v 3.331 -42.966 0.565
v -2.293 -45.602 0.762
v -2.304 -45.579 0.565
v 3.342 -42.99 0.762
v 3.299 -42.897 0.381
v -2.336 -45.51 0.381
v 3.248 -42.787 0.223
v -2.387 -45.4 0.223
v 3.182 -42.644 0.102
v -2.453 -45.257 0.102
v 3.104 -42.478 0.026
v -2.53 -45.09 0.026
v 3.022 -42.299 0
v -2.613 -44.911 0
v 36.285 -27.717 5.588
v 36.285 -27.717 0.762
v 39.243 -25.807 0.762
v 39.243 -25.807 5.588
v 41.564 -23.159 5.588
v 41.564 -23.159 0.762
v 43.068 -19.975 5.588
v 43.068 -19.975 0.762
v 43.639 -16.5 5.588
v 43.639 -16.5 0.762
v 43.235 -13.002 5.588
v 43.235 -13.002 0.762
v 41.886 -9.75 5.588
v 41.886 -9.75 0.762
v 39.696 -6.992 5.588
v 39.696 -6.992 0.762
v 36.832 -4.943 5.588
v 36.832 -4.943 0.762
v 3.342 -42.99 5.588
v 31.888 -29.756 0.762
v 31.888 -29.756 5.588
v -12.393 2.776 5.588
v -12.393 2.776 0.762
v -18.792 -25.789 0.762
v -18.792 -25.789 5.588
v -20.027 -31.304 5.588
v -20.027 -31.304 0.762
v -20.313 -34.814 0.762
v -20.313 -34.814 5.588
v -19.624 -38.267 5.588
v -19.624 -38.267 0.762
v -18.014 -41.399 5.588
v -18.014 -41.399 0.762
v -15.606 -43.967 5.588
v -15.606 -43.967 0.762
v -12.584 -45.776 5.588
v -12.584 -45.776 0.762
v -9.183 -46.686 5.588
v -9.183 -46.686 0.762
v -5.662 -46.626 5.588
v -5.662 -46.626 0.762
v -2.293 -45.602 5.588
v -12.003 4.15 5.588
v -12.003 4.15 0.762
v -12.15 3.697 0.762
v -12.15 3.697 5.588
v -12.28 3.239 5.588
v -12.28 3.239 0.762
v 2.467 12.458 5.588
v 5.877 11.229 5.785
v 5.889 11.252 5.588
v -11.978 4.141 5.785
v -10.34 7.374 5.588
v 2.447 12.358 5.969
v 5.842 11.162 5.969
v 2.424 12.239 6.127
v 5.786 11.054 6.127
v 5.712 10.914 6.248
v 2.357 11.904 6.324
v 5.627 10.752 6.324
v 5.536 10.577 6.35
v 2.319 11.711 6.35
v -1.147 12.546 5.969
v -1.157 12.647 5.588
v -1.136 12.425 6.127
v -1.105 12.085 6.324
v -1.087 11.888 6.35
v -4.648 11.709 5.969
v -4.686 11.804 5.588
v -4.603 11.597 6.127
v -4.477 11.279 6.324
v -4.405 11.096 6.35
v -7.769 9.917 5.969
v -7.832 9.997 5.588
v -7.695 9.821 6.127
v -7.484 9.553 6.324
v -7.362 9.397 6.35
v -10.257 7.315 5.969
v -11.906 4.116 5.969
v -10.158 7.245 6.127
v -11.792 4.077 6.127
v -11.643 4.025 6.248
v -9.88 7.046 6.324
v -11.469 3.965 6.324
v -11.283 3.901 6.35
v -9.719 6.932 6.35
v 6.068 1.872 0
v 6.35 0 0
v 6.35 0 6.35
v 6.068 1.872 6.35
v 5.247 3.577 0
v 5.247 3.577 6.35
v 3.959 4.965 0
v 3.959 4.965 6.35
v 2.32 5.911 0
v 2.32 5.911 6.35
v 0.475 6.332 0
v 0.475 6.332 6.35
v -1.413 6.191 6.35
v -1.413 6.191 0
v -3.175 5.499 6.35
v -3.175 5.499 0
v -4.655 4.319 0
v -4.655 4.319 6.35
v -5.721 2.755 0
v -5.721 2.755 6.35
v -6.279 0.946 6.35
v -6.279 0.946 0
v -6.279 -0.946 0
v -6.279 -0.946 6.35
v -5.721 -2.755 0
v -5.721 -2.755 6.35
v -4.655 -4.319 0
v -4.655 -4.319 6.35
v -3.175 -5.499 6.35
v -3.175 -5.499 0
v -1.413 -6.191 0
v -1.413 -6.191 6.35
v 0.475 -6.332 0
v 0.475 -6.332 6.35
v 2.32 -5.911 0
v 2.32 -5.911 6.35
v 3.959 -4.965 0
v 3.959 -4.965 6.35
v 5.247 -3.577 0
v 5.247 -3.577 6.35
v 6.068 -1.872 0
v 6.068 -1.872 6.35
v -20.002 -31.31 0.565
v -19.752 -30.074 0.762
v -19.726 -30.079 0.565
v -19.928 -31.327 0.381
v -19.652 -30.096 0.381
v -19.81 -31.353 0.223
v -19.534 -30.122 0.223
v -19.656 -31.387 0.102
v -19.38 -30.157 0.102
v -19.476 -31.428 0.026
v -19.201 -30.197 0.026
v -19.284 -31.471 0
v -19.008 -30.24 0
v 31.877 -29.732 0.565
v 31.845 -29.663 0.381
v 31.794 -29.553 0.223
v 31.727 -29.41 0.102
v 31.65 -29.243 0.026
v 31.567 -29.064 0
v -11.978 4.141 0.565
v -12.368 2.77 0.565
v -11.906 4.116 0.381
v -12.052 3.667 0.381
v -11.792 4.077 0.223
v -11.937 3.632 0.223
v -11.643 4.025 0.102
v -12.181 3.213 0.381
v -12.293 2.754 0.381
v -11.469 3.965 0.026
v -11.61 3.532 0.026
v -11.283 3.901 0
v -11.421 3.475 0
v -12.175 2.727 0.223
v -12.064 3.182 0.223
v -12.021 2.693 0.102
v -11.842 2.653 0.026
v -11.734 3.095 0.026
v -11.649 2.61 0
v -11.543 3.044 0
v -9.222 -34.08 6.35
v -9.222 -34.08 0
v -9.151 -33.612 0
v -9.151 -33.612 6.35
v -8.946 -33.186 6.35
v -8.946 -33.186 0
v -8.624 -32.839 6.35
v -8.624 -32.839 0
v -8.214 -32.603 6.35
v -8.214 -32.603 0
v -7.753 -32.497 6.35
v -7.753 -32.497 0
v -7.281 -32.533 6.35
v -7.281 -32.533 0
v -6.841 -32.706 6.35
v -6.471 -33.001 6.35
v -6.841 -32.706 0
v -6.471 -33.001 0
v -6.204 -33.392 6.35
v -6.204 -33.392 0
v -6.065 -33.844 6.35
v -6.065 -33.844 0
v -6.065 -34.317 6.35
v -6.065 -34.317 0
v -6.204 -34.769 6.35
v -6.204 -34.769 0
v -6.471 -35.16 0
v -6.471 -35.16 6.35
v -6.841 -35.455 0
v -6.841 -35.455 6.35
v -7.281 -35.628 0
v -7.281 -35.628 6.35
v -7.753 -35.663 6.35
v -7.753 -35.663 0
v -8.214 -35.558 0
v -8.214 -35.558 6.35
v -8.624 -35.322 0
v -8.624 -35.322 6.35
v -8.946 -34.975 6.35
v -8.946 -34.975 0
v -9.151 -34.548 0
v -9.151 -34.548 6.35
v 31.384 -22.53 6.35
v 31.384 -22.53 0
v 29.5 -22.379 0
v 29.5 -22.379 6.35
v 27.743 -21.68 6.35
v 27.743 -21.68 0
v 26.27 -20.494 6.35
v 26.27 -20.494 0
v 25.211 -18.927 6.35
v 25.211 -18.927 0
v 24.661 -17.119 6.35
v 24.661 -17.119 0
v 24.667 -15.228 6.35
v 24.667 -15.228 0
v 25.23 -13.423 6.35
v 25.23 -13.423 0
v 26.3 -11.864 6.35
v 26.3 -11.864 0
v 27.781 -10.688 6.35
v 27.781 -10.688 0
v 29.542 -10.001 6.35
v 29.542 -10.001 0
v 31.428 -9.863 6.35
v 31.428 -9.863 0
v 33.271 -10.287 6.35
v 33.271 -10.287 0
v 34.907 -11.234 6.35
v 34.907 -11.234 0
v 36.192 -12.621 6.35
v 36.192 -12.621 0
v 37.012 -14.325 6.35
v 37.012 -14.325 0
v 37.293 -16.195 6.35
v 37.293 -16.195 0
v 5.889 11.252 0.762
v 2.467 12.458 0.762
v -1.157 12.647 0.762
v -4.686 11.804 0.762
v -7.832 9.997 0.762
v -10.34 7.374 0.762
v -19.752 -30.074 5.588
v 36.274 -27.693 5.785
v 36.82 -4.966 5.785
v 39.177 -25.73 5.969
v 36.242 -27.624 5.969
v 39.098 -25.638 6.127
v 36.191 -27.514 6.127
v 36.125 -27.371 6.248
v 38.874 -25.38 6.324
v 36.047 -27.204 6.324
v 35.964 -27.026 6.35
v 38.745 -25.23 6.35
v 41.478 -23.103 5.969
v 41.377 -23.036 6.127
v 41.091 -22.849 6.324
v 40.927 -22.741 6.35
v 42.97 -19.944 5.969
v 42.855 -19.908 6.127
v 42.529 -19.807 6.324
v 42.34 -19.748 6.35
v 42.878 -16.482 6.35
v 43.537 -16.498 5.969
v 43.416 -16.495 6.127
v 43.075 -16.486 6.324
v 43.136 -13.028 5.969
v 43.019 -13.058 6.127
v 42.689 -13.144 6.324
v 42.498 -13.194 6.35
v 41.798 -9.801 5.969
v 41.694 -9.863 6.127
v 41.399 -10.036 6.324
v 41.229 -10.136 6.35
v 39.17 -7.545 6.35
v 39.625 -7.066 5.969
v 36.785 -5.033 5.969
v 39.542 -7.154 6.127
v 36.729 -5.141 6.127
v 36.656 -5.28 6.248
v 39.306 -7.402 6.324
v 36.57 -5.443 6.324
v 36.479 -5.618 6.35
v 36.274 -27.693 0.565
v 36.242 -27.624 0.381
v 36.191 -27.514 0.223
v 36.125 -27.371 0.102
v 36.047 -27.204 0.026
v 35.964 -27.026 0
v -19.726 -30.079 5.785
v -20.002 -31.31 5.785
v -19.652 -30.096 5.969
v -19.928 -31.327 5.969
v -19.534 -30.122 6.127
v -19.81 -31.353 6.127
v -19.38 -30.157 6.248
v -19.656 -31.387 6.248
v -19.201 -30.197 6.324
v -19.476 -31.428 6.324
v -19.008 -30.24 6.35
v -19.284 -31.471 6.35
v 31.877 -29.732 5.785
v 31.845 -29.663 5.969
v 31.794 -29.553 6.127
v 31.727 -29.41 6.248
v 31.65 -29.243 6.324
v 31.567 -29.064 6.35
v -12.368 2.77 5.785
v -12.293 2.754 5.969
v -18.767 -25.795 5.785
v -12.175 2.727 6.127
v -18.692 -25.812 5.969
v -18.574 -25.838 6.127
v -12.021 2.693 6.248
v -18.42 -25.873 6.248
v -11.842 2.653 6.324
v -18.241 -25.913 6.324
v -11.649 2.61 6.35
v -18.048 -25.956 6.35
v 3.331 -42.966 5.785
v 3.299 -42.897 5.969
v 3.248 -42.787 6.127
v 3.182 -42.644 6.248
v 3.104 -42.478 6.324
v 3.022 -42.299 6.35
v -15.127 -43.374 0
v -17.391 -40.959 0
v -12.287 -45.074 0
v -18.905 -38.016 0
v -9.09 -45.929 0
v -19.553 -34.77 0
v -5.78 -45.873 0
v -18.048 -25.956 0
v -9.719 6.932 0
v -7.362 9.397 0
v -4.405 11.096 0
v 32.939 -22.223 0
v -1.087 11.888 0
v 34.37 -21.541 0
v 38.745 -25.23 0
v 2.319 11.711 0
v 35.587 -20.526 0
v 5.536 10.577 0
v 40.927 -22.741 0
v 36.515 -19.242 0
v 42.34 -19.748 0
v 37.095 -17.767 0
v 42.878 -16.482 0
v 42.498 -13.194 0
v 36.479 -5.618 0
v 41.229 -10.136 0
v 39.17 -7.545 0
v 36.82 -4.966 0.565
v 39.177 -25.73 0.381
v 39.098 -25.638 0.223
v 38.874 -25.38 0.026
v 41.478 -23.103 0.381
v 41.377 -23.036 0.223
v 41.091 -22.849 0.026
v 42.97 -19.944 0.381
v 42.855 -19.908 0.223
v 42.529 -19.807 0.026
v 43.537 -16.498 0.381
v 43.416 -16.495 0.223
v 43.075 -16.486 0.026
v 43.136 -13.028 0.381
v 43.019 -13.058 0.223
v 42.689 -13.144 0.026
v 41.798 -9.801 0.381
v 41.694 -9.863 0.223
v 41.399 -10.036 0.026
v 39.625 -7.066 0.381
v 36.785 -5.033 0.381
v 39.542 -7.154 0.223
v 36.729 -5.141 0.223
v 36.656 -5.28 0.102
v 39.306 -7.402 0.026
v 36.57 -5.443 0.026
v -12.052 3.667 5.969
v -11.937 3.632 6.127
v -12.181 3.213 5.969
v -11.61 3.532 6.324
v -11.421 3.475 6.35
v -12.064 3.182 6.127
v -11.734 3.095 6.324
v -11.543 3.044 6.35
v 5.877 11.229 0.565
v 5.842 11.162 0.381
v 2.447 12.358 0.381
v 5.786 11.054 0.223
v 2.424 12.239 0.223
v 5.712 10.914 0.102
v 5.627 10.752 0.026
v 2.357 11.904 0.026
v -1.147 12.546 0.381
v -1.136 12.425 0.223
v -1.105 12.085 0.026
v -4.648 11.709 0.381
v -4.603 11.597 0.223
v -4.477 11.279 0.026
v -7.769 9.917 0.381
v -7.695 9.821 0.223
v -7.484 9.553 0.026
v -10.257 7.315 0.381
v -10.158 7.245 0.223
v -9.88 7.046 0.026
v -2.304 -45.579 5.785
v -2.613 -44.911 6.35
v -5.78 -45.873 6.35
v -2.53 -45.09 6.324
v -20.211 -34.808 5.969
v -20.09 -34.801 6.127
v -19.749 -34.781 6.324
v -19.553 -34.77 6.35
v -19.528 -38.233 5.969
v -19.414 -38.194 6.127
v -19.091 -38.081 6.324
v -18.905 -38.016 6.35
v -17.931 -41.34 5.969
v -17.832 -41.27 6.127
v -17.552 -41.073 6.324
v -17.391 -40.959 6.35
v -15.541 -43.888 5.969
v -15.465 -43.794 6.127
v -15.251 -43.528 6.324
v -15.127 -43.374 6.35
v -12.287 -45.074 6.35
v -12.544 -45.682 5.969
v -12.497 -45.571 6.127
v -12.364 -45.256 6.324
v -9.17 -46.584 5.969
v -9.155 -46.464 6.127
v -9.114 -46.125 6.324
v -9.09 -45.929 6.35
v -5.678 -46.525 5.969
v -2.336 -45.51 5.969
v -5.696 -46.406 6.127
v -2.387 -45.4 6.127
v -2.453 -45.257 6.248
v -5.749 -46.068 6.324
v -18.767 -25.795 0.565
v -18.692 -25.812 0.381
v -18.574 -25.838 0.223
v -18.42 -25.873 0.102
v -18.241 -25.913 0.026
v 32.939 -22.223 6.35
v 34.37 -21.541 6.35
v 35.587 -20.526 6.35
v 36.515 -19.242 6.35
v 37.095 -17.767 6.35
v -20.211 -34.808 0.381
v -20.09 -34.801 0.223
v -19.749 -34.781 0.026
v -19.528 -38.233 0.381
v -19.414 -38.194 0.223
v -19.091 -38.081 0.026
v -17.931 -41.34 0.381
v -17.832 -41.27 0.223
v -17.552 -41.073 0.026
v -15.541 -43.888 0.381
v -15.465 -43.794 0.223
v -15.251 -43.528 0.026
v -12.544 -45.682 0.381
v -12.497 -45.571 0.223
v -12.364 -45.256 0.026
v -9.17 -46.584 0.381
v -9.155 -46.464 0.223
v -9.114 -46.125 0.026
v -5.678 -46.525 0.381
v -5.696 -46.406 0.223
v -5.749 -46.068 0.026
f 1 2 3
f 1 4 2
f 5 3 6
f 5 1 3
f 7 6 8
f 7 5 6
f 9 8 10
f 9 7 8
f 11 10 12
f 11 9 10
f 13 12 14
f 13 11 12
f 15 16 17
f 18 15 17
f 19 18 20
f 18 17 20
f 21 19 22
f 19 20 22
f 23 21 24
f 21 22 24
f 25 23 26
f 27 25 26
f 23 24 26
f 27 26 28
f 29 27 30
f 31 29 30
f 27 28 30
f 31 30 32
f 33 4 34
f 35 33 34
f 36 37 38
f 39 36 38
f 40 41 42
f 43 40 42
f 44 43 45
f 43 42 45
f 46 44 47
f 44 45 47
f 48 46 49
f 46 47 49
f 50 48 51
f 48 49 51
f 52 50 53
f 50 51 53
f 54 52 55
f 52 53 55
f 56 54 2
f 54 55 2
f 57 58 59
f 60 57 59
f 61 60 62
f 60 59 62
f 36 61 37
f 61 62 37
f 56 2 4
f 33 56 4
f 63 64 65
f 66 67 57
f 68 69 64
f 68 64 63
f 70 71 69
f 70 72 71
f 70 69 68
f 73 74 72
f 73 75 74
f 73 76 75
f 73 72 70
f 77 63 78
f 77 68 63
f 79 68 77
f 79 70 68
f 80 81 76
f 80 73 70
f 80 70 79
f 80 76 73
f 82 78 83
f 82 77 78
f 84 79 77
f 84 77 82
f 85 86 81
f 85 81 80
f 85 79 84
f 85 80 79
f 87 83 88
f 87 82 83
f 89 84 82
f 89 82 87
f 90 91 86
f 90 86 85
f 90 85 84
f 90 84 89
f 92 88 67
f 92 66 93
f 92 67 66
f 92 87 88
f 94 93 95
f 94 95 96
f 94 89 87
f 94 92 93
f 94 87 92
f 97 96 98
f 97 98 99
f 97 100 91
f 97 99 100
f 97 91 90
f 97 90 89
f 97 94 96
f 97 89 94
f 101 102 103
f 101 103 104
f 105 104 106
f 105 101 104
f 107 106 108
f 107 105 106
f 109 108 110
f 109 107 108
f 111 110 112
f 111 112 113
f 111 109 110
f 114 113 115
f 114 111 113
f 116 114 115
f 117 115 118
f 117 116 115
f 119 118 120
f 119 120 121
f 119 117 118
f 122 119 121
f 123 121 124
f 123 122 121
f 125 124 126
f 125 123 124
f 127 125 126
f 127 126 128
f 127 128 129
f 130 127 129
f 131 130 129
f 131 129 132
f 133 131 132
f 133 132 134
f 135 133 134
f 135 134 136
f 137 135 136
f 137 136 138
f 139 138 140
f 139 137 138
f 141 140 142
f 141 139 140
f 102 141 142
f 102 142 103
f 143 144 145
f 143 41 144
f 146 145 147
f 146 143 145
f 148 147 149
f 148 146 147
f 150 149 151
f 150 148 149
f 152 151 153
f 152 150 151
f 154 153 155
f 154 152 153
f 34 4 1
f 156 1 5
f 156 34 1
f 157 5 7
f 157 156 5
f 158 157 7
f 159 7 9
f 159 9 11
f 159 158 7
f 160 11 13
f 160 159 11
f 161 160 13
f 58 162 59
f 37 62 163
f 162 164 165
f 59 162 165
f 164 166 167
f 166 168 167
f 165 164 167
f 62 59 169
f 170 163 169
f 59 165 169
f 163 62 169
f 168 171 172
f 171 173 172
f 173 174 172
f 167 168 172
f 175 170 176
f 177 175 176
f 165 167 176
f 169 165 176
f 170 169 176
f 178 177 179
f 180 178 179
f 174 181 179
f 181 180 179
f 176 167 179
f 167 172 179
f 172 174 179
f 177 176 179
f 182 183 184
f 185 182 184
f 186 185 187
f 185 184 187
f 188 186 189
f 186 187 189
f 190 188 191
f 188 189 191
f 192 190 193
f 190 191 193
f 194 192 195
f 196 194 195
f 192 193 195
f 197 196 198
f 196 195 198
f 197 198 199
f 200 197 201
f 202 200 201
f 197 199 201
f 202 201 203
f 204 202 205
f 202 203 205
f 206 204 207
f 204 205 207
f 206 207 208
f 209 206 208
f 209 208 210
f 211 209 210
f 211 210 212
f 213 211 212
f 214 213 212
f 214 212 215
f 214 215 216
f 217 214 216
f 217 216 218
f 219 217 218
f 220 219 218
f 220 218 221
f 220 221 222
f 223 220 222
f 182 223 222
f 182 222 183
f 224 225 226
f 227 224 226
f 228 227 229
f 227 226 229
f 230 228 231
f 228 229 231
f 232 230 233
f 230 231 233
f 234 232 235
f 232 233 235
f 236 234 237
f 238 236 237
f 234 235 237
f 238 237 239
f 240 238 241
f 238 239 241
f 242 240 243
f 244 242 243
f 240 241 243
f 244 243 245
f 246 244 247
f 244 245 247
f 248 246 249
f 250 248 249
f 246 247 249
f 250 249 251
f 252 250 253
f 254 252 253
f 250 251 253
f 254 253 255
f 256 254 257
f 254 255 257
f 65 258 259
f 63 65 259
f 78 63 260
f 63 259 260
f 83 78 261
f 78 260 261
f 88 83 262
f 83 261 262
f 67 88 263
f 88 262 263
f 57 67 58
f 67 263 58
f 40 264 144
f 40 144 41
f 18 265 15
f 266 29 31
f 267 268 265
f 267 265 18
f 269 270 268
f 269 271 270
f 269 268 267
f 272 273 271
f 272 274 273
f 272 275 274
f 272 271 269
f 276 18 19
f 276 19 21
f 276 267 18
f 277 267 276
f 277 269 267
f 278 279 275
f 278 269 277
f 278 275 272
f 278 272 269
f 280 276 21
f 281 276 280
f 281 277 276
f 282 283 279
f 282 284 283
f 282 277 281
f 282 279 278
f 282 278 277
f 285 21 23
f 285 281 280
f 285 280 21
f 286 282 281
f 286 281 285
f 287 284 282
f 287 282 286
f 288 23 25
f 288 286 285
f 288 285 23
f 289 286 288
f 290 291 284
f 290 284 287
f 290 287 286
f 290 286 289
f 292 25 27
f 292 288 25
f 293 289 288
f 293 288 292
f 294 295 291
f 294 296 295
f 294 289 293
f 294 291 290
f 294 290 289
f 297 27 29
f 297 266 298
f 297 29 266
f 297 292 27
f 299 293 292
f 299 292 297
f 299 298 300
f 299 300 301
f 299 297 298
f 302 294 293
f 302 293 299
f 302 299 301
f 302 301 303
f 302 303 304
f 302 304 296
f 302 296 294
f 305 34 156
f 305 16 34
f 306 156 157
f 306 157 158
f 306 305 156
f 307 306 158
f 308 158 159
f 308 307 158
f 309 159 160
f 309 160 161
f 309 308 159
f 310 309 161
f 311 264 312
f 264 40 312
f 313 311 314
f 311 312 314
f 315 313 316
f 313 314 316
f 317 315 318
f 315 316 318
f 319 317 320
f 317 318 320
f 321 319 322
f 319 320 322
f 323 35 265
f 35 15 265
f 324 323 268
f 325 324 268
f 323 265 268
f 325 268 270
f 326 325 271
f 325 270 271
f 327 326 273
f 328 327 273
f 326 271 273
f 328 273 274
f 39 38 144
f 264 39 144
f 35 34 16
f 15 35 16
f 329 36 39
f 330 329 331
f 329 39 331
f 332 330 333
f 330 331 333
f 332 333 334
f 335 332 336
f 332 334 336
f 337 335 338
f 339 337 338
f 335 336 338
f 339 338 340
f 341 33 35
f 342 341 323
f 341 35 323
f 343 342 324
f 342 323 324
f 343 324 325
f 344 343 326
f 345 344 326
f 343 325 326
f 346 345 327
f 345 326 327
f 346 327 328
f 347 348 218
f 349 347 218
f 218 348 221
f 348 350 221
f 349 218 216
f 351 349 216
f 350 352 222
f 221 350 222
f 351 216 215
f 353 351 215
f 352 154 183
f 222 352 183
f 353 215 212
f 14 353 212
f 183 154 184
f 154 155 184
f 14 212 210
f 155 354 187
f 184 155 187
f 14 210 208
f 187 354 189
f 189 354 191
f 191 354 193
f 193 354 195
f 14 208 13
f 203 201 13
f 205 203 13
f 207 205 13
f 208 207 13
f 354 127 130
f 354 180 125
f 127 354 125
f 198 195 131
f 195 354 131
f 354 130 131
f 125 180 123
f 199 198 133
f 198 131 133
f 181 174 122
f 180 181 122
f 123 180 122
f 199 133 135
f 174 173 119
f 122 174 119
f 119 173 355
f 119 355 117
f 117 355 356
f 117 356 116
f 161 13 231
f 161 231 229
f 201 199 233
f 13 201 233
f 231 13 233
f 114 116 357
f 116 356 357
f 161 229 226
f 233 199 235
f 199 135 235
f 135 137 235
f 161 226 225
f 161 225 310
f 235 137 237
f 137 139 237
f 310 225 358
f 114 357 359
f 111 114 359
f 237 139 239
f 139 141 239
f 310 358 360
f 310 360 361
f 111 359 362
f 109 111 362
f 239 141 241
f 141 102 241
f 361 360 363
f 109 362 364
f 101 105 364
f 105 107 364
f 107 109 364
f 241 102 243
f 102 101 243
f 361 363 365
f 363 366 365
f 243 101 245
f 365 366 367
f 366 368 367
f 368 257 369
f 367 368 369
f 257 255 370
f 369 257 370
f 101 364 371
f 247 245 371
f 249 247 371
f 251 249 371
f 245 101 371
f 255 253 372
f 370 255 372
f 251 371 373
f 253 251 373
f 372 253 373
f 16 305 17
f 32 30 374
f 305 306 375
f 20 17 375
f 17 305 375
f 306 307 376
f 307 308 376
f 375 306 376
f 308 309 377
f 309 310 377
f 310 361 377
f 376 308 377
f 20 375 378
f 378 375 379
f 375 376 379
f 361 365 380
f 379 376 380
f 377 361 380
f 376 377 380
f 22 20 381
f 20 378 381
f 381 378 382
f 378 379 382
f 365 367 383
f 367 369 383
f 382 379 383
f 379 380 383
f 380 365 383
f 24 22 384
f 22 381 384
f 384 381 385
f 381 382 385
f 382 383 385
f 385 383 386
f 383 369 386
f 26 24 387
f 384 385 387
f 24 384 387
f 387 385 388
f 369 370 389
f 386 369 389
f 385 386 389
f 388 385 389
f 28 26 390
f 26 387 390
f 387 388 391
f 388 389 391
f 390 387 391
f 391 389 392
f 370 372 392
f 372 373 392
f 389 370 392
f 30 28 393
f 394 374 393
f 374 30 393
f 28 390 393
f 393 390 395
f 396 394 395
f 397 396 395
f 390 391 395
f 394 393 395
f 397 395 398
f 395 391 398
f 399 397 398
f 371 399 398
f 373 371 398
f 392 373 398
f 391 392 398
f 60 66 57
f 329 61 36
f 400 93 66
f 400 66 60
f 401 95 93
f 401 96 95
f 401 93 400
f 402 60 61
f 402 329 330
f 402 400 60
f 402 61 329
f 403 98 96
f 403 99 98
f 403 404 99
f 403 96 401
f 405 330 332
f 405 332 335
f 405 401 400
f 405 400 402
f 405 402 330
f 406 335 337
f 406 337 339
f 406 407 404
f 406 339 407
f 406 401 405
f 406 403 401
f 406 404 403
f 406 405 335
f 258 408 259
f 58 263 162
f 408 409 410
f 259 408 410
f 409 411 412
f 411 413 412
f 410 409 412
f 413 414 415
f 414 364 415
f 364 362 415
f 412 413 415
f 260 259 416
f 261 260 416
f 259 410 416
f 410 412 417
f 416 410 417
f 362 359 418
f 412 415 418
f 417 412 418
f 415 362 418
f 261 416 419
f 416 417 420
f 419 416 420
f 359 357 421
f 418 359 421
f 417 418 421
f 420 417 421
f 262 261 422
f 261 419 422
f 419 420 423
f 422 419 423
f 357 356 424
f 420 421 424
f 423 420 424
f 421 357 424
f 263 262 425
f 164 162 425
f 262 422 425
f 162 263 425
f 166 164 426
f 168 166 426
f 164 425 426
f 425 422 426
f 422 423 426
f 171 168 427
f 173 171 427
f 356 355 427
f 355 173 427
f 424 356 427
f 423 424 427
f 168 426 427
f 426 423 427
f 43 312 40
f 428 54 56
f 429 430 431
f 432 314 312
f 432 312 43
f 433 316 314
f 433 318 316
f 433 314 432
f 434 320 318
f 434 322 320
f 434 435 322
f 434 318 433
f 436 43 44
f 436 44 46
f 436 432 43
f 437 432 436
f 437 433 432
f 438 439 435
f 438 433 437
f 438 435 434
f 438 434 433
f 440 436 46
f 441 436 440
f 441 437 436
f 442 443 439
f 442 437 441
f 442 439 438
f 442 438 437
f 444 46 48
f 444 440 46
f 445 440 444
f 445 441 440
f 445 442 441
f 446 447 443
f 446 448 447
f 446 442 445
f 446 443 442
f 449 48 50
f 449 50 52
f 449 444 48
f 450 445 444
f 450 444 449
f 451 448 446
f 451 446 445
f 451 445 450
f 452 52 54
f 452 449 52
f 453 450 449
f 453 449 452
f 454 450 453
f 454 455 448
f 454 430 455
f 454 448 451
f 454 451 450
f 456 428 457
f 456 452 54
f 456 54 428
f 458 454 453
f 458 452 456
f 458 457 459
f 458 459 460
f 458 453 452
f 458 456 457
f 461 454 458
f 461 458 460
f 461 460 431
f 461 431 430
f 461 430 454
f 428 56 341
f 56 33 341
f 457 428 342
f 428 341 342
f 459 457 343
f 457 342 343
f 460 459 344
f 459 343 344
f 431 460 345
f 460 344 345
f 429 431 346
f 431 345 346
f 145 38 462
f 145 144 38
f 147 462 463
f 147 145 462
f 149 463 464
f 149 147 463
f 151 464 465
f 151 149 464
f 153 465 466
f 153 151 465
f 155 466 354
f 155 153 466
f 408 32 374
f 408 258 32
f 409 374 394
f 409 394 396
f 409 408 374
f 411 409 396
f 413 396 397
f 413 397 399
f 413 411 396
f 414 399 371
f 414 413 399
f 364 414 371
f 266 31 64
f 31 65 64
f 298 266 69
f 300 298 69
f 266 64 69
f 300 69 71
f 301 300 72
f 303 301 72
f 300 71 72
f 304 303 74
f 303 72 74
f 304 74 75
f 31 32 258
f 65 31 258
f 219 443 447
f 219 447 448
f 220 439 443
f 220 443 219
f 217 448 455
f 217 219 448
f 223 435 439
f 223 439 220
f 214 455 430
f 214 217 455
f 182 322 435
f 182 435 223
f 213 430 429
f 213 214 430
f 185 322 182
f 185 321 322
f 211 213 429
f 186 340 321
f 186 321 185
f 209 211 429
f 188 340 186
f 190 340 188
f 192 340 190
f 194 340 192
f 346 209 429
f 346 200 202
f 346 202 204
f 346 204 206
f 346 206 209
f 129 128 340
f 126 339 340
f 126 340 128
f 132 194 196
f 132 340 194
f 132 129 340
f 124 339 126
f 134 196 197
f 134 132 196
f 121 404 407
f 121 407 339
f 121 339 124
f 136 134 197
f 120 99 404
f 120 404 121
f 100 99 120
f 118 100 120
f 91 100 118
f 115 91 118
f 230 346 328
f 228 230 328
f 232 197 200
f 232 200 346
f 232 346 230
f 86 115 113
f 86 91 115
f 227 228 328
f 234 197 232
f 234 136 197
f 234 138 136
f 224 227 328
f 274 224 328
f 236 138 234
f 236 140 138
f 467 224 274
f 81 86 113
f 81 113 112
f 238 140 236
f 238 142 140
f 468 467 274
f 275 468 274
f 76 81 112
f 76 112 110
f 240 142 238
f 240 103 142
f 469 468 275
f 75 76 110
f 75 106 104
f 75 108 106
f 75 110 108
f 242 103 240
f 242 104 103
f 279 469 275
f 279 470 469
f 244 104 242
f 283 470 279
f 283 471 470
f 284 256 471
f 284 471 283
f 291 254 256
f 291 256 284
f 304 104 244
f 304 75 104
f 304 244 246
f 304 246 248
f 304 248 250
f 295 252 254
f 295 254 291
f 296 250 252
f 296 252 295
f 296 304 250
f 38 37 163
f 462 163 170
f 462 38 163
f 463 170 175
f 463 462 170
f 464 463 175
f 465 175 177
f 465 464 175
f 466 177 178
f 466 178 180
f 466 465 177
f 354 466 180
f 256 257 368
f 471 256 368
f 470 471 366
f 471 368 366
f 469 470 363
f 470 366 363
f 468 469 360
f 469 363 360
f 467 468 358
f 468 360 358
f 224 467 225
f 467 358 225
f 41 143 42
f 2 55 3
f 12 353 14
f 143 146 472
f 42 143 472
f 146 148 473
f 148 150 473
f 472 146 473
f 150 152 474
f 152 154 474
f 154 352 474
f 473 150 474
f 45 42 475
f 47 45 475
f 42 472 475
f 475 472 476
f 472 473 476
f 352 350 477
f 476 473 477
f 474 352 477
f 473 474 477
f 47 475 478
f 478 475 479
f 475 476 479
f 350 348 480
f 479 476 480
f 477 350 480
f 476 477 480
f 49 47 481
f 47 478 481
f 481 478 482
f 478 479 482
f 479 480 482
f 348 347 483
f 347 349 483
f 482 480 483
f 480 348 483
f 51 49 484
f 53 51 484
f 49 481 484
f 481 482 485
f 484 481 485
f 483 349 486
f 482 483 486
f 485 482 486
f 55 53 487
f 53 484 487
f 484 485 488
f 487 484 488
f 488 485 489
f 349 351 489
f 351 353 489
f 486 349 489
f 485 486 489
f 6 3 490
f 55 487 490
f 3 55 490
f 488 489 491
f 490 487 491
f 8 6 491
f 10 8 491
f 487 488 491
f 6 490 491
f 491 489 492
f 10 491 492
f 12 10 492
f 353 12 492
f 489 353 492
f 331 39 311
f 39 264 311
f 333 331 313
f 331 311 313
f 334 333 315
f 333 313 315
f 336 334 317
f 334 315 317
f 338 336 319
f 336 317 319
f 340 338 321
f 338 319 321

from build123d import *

# Parameters (mm, degrees)
F0_R     = 6.35
F0_R_2   = 3.175
F1_DEPTH = 6.35
F2_R     = 0.762
F4_D     = 3.175


with BuildPart() as f1:
    # F0 (on Top) → F1 (new body)
    with BuildSketch(Plane.XY):
        with BuildLine():
            ThreePointArc((-15.4277360093, -33.1291600779), (-17.6097258518, -31.6297541594), (-19.7516389471, -30.0736352458))
            Line((-19.7516389471, -30.0736352458), (-20.0273010704, -31.3041983899))
            ThreePointArc((-20.0273010704, -31.3041983899), (-15.605527233, -43.9673113737), (-2.2926258159, -45.6022946054))
            Line((-2.2926258159, -45.6022946054), (3.3420161223, -42.9899532533))
            ThreePointArc((3.3420161223, -42.9899532533), (-0.5573553186, -41.3437618471), (-4.3842812821, -39.5355357964))
            ThreePointArc((-4.3842812821, -39.5355357964), (-9.1948370721, -40.2356556442), (-13.0909002079, -37.32837051))
            ThreePointArc((-13.0909002079, -37.32837051), (-14.2898816566, -35.2457737279), (-15.4277360093, -33.1291600779))
        make_face()
        with BuildLine():
            ThreePointArc((5.8890733938, 11.2520582367), (-4.6857632411, 11.8039664032), (-12.0029711474, 4.1495401716))
            ThreePointArc((-12.0029711474, 4.1495401716), (-9.4049707621, -13.9914505961), (-2.1779859288, -30.8323485013))
            ThreePointArc((-2.1779859288, -30.8323485013), (-1.4791469298, -35.6407535094), (-4.3842812821, -39.5355357964))
            ThreePointArc((-4.3842812821, -39.5355357964), (-0.5573553186, -41.3437618471), (3.3420161223, -42.9899532533))
            Line((3.3420161223, -42.9899532533), (31.8875731001, -29.7556182717))
            Line((31.8875731001, -29.7556182717), (36.2849774034, -27.7168869328))
            ThreePointArc((36.2849774034, -27.7168869328), (43.6394950275, -16.5000431331), (36.8322335447, -4.9428935964))
            Line((36.8322335447, -4.9428935964), (5.8890733938, 11.2520582367))
        make_face()
        Circle(F0_R, mode=Mode.SUBTRACT)
        with BuildLine():
            ThreePointArc((37.2931601509, -16.1949518331), (35.5866457226, -20.5262959369), (31.384328105, -22.5296081644))
            ThreePointArc((31.384328105, -22.5296081644), (26.2996745793, -11.8636077292), (37.2931601509, -16.1949518331))
        make_face(mode=Mode.SUBTRACT)
        with BuildLine():
            ThreePointArc((-18.7919287035, -25.7894628669), (-17.199620286, -29.5004662895), (-15.4277360093, -33.1291600779))
            ThreePointArc((-15.4277360093, -33.1291600779), (-10.0074027219, -36.507133329), (-4.3842812821, -39.5355357964))
            ThreePointArc((-4.3842812821, -39.5355357964), (-1.4791469298, -35.6407535094), (-2.1779859288, -30.8323485013))
            ThreePointArc((-2.1779859288, -30.8323485013), (-9.4049707621, -13.9914505961), (-12.0029711474, 4.1495401716))
            ThreePointArc((-12.0029711474, 4.1495401716), (-12.2172281013, 3.4683335365), (-12.3928580021, 2.7761611158))
            Line((-12.3928580021, 2.7761611158), (-18.7919287035, -25.7894628669))
        make_face()
        with Locations((-7.6344430684, -34.0803595057)):
            Circle(F0_R_2, mode=Mode.SUBTRACT)
        with BuildLine():
            Line((-18.7919287035, -25.7894628669), (-19.7516389471, -30.0736352458))
            ThreePointArc((-19.7516389471, -30.0736352458), (-17.6097258518, -31.6297541594), (-15.4277360093, -33.1291600779))
            ThreePointArc((-15.4277360093, -33.1291600779), (-17.199620286, -29.5004662895), (-18.7919287035, -25.7894628669))
        make_face()
        with BuildLine():
            ThreePointArc((-4.3842812821, -39.5355357964), (-10.0074027219, -36.507133329), (-15.4277360093, -33.1291600779))
            ThreePointArc((-15.4277360093, -33.1291600779), (-14.2898816566, -35.2457737279), (-13.0909002079, -37.32837051))
            ThreePointArc((-13.0909002079, -37.32837051), (-9.1948370721, -40.2356556442), (-4.3842812821, -39.5355357964))
        make_face()
        with Locations((-7.6344430684, -34.0803595057)):
            Circle(F0_R_2)
    extrude(amount=F1_DEPTH)

    # F2
    f2_edges = [f1.edges().sort_by_distance(p)[0] for p in [
        (-15.605527, -43.967311, 6.35),
        (16.996176, -36.659591, 6.35),
        (16.996176, -36.659591, 0),
        (-15.605527, -43.967311, 0),
    ]]
    fillet(f2_edges, radius=F2_R)

    # F4 (through all)
    with Locations(Plane.XY.offset(6.35)):
        with Locations((-7.6344430684, -34.0803595057)):
            Hole(F4_D / 2)


solid = f1.part
